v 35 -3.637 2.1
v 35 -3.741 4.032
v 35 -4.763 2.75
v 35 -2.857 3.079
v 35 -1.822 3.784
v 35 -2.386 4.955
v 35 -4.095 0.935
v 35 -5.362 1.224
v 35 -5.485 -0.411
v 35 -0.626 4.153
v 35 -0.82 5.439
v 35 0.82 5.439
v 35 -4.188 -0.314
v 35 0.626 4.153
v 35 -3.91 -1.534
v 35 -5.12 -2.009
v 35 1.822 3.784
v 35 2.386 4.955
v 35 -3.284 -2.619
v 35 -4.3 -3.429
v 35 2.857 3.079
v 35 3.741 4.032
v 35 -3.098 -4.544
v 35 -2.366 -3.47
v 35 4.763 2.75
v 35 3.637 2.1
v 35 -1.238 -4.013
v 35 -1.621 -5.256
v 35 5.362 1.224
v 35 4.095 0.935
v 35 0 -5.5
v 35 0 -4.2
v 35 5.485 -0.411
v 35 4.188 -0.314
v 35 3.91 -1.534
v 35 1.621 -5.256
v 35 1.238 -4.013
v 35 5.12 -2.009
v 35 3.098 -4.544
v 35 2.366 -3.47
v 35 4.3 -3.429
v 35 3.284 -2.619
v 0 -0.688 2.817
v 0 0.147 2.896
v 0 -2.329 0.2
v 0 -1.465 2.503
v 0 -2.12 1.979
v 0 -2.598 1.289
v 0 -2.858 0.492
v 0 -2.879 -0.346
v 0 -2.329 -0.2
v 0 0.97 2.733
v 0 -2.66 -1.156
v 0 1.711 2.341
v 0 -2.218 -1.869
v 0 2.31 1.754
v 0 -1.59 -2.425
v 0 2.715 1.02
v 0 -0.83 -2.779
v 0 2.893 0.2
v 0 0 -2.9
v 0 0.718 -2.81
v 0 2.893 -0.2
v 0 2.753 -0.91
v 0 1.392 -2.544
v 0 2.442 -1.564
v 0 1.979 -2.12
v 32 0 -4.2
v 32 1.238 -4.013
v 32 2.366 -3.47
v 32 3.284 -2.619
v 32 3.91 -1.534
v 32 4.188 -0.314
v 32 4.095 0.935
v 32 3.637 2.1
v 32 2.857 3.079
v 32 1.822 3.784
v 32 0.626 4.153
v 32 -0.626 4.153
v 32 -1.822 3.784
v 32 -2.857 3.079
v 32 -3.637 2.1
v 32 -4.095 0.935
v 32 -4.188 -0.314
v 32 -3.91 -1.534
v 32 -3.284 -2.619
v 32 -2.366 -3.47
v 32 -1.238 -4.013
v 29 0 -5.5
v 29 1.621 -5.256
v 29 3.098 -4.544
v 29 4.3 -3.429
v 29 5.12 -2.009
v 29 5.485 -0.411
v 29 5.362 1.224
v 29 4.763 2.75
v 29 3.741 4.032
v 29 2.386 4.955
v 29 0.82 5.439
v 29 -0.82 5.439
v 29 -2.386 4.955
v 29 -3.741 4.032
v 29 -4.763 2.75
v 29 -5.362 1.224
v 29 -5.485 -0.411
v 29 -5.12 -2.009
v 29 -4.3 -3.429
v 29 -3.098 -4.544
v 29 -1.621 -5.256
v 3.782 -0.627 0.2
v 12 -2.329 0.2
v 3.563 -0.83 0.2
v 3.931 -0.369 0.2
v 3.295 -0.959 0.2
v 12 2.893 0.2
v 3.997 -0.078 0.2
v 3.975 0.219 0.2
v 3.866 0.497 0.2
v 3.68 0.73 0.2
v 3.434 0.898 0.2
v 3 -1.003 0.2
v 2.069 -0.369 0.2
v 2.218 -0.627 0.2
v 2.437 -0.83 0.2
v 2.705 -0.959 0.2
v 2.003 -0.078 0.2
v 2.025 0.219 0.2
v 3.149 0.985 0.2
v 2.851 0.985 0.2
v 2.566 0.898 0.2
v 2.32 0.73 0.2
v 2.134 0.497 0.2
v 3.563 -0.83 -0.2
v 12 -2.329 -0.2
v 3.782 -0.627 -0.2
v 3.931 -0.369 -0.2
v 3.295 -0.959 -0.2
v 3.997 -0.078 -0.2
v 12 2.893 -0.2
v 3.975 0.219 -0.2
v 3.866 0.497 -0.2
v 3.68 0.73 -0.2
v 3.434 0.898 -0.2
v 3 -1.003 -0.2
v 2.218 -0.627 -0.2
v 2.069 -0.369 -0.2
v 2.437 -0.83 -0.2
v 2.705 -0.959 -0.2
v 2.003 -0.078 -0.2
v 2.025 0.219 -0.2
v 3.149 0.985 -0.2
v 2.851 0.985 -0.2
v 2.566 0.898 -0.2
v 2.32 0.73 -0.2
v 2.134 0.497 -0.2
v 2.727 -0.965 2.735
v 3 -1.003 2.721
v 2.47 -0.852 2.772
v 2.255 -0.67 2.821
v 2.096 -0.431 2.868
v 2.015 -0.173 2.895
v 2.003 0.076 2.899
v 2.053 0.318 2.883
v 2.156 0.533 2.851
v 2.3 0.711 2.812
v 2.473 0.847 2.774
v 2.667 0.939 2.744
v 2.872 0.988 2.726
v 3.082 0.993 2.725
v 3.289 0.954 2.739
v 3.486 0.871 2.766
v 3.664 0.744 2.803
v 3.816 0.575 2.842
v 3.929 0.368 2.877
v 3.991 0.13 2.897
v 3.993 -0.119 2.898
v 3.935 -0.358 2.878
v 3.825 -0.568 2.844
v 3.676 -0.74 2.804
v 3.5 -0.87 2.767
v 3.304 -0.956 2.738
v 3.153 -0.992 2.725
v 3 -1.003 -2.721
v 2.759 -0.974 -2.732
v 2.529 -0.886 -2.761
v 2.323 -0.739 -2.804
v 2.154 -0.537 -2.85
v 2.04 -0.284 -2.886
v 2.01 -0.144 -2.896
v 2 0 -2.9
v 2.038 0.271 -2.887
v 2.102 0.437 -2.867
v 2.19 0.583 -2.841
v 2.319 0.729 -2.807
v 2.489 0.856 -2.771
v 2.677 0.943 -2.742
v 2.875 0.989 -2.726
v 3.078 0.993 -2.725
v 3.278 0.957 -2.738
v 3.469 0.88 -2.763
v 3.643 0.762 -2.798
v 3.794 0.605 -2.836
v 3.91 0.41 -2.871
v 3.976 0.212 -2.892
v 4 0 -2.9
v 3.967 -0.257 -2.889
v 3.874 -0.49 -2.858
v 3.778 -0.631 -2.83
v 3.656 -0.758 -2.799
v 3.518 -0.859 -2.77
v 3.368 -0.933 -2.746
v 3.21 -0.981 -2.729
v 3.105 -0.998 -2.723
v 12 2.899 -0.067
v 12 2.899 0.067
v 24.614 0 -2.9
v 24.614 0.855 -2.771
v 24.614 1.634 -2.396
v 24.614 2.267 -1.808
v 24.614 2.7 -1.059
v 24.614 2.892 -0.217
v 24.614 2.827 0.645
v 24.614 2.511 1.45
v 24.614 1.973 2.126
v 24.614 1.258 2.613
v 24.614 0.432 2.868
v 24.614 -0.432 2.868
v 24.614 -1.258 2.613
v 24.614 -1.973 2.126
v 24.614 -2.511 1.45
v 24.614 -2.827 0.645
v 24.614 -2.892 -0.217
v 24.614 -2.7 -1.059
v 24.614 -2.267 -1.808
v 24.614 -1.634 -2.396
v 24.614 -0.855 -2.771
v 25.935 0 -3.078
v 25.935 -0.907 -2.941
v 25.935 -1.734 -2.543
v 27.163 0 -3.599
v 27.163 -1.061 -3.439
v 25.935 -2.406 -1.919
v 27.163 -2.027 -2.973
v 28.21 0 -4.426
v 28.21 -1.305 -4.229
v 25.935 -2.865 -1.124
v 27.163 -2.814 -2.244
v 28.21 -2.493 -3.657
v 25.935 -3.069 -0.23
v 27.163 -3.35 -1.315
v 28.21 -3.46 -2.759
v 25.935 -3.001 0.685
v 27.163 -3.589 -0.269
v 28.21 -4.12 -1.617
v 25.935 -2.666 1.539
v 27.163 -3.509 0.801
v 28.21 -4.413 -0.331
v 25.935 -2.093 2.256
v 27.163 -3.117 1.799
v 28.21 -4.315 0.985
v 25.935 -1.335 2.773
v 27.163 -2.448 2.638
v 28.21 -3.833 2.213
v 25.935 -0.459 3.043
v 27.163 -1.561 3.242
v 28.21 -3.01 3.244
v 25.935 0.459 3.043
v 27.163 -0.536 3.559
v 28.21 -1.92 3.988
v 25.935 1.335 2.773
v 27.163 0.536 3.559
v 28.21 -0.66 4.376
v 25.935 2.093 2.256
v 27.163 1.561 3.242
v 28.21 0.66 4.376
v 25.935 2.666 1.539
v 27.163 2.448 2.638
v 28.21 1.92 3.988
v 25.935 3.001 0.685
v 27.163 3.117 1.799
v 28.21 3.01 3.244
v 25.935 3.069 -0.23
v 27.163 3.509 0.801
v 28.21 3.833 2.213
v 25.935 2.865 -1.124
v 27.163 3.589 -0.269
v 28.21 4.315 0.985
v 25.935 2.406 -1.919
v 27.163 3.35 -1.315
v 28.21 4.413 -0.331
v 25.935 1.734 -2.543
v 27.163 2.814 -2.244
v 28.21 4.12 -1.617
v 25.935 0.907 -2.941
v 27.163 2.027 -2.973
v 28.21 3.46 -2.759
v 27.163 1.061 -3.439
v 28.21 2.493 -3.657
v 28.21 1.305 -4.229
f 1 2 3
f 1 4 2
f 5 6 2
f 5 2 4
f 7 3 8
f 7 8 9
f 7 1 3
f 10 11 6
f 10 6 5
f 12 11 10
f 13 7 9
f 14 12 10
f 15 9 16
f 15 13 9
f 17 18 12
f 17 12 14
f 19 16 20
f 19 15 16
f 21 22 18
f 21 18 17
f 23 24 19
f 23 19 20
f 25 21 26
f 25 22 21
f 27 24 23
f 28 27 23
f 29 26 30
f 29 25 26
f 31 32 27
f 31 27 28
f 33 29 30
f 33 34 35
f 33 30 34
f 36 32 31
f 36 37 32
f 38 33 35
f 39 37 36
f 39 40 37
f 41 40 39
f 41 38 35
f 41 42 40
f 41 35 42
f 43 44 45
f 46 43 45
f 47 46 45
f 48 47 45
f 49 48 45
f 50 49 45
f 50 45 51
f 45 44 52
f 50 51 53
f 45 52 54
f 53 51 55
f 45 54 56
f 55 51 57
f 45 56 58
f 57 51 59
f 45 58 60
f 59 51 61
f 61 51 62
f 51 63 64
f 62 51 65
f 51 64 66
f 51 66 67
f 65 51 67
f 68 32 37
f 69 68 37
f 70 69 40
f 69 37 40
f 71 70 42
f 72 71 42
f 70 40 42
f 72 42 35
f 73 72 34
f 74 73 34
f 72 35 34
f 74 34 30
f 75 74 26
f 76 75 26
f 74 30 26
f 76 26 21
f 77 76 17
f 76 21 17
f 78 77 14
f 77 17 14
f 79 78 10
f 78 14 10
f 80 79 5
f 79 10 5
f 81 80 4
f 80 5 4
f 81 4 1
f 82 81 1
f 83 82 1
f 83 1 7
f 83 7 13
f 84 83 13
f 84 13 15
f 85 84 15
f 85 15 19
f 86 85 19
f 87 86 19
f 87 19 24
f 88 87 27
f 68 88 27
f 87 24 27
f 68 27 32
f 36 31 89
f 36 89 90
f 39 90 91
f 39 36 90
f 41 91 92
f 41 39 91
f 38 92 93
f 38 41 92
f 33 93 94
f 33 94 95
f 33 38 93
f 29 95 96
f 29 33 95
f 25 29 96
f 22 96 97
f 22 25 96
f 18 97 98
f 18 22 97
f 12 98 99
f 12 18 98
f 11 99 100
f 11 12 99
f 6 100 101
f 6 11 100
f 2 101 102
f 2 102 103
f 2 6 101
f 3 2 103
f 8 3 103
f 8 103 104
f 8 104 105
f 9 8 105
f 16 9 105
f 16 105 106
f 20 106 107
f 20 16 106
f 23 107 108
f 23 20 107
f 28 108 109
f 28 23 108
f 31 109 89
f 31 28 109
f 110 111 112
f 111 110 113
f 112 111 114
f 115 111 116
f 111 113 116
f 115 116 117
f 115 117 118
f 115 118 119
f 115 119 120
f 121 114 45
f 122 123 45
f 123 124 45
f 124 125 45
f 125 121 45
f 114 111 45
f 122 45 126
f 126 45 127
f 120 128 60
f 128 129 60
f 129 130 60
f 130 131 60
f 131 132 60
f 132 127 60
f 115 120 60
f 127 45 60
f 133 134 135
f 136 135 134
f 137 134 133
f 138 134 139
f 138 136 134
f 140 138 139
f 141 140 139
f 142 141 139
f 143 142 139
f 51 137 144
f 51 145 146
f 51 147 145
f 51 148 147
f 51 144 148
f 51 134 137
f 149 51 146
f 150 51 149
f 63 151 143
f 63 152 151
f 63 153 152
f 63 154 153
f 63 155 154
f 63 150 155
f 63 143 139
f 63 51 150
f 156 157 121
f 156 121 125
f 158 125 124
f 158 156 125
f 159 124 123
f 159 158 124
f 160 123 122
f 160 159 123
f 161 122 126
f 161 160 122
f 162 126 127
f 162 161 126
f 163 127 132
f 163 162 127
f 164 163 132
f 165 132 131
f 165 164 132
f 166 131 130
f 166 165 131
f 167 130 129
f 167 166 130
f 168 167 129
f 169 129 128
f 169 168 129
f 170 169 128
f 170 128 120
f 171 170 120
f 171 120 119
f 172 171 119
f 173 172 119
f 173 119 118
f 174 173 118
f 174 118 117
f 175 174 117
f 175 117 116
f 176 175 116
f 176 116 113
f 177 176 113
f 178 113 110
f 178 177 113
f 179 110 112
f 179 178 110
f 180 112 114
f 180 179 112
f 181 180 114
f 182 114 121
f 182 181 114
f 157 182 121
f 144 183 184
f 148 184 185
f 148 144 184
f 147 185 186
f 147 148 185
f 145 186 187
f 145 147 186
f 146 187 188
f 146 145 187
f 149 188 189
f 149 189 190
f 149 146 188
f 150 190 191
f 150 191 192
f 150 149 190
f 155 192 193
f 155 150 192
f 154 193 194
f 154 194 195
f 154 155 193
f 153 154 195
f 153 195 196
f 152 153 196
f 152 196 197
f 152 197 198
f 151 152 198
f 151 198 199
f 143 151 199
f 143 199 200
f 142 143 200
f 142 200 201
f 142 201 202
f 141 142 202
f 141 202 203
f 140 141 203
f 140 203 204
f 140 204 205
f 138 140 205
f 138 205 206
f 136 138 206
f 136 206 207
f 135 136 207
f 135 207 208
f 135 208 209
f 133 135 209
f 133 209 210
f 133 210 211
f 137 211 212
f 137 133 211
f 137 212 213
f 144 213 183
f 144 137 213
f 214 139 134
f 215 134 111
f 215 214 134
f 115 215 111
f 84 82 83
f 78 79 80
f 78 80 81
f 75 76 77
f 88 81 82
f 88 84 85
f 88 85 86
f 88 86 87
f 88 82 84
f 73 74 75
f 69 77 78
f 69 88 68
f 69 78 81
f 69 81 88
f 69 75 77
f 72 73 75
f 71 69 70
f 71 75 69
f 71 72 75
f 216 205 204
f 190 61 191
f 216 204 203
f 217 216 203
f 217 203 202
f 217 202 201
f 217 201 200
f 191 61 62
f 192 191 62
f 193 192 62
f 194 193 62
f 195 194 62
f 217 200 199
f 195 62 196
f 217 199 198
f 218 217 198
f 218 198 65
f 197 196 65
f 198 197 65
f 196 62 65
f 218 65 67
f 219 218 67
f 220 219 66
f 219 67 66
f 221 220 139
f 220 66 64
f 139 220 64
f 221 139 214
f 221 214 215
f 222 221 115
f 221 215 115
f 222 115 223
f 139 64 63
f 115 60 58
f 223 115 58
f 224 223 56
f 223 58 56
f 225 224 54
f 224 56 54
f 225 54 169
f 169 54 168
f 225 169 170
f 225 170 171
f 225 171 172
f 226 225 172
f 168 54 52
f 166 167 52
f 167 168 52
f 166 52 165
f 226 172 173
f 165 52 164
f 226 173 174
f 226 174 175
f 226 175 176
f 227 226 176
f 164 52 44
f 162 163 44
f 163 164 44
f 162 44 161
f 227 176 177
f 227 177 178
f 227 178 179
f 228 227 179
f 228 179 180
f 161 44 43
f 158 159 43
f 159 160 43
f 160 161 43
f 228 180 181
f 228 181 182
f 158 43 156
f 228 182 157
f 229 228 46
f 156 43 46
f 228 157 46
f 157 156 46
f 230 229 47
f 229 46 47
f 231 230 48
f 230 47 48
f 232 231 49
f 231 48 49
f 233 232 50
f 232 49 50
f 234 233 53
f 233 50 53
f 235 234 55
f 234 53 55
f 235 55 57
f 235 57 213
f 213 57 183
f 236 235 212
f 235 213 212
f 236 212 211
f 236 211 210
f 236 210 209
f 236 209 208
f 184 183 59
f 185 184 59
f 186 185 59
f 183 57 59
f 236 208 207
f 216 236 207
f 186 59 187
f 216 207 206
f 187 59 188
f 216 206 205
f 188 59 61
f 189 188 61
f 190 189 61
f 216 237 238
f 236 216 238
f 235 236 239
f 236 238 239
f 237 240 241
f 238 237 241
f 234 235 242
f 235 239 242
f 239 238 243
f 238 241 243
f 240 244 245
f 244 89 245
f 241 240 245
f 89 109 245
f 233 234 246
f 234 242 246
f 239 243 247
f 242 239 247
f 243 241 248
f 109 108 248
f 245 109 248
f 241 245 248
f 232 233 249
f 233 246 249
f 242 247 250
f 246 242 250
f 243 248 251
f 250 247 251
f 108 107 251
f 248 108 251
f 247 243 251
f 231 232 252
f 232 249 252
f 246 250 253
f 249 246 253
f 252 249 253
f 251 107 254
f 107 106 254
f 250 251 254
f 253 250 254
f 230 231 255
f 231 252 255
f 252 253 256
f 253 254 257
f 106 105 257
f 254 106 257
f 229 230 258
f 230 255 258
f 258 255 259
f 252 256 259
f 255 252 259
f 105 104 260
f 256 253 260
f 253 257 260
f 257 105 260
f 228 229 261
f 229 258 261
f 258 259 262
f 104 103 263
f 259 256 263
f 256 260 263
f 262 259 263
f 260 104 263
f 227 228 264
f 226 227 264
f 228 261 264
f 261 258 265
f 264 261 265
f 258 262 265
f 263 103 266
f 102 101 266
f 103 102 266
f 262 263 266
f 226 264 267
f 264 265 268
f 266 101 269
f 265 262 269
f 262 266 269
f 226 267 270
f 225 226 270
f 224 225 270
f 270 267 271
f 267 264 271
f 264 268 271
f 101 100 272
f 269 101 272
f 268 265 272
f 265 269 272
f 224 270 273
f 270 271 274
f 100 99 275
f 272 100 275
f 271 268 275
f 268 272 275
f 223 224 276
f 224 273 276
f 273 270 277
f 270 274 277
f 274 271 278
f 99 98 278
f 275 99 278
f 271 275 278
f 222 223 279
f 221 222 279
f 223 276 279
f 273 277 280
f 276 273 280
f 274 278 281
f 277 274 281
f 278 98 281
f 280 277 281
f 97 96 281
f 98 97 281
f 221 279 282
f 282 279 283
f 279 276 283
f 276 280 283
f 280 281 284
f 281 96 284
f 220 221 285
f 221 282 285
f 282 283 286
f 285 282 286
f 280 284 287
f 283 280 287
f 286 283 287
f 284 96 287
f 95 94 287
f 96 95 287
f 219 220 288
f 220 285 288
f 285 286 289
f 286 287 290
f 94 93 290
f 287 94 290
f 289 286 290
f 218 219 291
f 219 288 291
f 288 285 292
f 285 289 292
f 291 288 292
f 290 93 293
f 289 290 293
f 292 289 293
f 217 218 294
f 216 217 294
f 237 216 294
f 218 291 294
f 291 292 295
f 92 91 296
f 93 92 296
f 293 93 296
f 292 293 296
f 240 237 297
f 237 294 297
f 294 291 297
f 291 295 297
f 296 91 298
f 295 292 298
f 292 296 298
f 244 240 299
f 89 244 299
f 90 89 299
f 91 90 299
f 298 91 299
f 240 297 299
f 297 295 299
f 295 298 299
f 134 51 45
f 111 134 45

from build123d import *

# Parameters (mm, degrees)
SKETCH_1_R               = 2.9
EXTRUDE_1_DEPTH          = 35
SKETCH_2_W               = 0.4
SKETCH_2_H               = 5.450532248
CUT_EXTRUDE_1_DEPTH      = 12
CUT_EXTRUDE_2_DEPTH      = 10
CUT_EXTRUDE_2_DEPTH_BACK = 10
SKETCH_3_R               = 1
SKETCH_4_R               = 5.5
EXTRUDE_2_DEPTH          = 6
SKETCH_5_R               = 4.2
CUT_EXTRUDE_3_DEPTH      = 3
FILLET_1_R               = 5


with BuildPart() as part:
    # 草图1 → 凸台-拉伸1 (new body)
    with BuildSketch(Plane(origin=(0, 0, 0), x_dir=(0, 0, -1), z_dir=(1, 0, 0))):
        Circle(SKETCH_1_R)
    extrude(amount=EXTRUDE_1_DEPTH)

    # 草图2 → 切除-拉伸1 (cut)
    with BuildSketch(Plane.ZY):
        with Locations((0, 0.396255312)):
            Rectangle(SKETCH_2_W, SKETCH_2_H)
    extrude(amount=-CUT_EXTRUDE_1_DEPTH, mode=Mode.SUBTRACT)

    # 草图3 → 切除-拉伸2 (cut, two sides: drawn at the far end of the back side and taken through both)
    with BuildSketch(Plane(origin=(0, 0, 0.2), x_dir=(-1, 0, 0), z_dir=(0, 0, -1)).offset(-CUT_EXTRUDE_2_DEPTH_BACK)):
        with Locations(Location((-3, -0.003452386, 0), (0, 0, 270))):
            Circle(SKETCH_3_R)
    extrude(amount=CUT_EXTRUDE_2_DEPTH + CUT_EXTRUDE_2_DEPTH_BACK, mode=Mode.SUBTRACT)

    # 草图4 → 凸台-拉伸2 (add)
    with BuildSketch(Plane(origin=(35, 0, 0), x_dir=(0, 0, -1), z_dir=(1, 0, 0))):
        Circle(SKETCH_4_R)
    extrude(amount=-EXTRUDE_2_DEPTH)

    # 草图5 → 切除-拉伸3 (cut)
    with BuildSketch(Plane(origin=(35, 0, 0), x_dir=(0, 0, -1), z_dir=(1, 0, 0))):
        Circle(SKETCH_5_R)
    extrude(amount=-CUT_EXTRUDE_3_DEPTH, mode=Mode.SUBTRACT)

    # 圆角1
    # the kernel refuses this fillet: 5 mm, written as the material it adds along each edge
    with BuildSketch(Plane(origin=(29, 0, 0), x_dir=(0, 0, -1), z_dir=(0, 1, 0))) as fillet_1_piece_1:
        with BuildLine():
            CenterArc((7.9, 4.38634244), FILLET_1_R, 180, 61.314597986)
            Line((5.5, 0), (5.452, -0.087726849))
            ThreePointArc((5.452, -0.087726849), (4.2, -0.1), (2.9, -0.1))
            Line((2.9, -0.1), (2.8, 0))
            Line((2.8, 0), (2.8, 4.38634244))
            Line((2.8, 4.38634244), (2.9, 4.38634244))
        make_face()
    revolve(axis=Axis((29, 0, 0), (-1, 0, 0)))


solid = part.part
